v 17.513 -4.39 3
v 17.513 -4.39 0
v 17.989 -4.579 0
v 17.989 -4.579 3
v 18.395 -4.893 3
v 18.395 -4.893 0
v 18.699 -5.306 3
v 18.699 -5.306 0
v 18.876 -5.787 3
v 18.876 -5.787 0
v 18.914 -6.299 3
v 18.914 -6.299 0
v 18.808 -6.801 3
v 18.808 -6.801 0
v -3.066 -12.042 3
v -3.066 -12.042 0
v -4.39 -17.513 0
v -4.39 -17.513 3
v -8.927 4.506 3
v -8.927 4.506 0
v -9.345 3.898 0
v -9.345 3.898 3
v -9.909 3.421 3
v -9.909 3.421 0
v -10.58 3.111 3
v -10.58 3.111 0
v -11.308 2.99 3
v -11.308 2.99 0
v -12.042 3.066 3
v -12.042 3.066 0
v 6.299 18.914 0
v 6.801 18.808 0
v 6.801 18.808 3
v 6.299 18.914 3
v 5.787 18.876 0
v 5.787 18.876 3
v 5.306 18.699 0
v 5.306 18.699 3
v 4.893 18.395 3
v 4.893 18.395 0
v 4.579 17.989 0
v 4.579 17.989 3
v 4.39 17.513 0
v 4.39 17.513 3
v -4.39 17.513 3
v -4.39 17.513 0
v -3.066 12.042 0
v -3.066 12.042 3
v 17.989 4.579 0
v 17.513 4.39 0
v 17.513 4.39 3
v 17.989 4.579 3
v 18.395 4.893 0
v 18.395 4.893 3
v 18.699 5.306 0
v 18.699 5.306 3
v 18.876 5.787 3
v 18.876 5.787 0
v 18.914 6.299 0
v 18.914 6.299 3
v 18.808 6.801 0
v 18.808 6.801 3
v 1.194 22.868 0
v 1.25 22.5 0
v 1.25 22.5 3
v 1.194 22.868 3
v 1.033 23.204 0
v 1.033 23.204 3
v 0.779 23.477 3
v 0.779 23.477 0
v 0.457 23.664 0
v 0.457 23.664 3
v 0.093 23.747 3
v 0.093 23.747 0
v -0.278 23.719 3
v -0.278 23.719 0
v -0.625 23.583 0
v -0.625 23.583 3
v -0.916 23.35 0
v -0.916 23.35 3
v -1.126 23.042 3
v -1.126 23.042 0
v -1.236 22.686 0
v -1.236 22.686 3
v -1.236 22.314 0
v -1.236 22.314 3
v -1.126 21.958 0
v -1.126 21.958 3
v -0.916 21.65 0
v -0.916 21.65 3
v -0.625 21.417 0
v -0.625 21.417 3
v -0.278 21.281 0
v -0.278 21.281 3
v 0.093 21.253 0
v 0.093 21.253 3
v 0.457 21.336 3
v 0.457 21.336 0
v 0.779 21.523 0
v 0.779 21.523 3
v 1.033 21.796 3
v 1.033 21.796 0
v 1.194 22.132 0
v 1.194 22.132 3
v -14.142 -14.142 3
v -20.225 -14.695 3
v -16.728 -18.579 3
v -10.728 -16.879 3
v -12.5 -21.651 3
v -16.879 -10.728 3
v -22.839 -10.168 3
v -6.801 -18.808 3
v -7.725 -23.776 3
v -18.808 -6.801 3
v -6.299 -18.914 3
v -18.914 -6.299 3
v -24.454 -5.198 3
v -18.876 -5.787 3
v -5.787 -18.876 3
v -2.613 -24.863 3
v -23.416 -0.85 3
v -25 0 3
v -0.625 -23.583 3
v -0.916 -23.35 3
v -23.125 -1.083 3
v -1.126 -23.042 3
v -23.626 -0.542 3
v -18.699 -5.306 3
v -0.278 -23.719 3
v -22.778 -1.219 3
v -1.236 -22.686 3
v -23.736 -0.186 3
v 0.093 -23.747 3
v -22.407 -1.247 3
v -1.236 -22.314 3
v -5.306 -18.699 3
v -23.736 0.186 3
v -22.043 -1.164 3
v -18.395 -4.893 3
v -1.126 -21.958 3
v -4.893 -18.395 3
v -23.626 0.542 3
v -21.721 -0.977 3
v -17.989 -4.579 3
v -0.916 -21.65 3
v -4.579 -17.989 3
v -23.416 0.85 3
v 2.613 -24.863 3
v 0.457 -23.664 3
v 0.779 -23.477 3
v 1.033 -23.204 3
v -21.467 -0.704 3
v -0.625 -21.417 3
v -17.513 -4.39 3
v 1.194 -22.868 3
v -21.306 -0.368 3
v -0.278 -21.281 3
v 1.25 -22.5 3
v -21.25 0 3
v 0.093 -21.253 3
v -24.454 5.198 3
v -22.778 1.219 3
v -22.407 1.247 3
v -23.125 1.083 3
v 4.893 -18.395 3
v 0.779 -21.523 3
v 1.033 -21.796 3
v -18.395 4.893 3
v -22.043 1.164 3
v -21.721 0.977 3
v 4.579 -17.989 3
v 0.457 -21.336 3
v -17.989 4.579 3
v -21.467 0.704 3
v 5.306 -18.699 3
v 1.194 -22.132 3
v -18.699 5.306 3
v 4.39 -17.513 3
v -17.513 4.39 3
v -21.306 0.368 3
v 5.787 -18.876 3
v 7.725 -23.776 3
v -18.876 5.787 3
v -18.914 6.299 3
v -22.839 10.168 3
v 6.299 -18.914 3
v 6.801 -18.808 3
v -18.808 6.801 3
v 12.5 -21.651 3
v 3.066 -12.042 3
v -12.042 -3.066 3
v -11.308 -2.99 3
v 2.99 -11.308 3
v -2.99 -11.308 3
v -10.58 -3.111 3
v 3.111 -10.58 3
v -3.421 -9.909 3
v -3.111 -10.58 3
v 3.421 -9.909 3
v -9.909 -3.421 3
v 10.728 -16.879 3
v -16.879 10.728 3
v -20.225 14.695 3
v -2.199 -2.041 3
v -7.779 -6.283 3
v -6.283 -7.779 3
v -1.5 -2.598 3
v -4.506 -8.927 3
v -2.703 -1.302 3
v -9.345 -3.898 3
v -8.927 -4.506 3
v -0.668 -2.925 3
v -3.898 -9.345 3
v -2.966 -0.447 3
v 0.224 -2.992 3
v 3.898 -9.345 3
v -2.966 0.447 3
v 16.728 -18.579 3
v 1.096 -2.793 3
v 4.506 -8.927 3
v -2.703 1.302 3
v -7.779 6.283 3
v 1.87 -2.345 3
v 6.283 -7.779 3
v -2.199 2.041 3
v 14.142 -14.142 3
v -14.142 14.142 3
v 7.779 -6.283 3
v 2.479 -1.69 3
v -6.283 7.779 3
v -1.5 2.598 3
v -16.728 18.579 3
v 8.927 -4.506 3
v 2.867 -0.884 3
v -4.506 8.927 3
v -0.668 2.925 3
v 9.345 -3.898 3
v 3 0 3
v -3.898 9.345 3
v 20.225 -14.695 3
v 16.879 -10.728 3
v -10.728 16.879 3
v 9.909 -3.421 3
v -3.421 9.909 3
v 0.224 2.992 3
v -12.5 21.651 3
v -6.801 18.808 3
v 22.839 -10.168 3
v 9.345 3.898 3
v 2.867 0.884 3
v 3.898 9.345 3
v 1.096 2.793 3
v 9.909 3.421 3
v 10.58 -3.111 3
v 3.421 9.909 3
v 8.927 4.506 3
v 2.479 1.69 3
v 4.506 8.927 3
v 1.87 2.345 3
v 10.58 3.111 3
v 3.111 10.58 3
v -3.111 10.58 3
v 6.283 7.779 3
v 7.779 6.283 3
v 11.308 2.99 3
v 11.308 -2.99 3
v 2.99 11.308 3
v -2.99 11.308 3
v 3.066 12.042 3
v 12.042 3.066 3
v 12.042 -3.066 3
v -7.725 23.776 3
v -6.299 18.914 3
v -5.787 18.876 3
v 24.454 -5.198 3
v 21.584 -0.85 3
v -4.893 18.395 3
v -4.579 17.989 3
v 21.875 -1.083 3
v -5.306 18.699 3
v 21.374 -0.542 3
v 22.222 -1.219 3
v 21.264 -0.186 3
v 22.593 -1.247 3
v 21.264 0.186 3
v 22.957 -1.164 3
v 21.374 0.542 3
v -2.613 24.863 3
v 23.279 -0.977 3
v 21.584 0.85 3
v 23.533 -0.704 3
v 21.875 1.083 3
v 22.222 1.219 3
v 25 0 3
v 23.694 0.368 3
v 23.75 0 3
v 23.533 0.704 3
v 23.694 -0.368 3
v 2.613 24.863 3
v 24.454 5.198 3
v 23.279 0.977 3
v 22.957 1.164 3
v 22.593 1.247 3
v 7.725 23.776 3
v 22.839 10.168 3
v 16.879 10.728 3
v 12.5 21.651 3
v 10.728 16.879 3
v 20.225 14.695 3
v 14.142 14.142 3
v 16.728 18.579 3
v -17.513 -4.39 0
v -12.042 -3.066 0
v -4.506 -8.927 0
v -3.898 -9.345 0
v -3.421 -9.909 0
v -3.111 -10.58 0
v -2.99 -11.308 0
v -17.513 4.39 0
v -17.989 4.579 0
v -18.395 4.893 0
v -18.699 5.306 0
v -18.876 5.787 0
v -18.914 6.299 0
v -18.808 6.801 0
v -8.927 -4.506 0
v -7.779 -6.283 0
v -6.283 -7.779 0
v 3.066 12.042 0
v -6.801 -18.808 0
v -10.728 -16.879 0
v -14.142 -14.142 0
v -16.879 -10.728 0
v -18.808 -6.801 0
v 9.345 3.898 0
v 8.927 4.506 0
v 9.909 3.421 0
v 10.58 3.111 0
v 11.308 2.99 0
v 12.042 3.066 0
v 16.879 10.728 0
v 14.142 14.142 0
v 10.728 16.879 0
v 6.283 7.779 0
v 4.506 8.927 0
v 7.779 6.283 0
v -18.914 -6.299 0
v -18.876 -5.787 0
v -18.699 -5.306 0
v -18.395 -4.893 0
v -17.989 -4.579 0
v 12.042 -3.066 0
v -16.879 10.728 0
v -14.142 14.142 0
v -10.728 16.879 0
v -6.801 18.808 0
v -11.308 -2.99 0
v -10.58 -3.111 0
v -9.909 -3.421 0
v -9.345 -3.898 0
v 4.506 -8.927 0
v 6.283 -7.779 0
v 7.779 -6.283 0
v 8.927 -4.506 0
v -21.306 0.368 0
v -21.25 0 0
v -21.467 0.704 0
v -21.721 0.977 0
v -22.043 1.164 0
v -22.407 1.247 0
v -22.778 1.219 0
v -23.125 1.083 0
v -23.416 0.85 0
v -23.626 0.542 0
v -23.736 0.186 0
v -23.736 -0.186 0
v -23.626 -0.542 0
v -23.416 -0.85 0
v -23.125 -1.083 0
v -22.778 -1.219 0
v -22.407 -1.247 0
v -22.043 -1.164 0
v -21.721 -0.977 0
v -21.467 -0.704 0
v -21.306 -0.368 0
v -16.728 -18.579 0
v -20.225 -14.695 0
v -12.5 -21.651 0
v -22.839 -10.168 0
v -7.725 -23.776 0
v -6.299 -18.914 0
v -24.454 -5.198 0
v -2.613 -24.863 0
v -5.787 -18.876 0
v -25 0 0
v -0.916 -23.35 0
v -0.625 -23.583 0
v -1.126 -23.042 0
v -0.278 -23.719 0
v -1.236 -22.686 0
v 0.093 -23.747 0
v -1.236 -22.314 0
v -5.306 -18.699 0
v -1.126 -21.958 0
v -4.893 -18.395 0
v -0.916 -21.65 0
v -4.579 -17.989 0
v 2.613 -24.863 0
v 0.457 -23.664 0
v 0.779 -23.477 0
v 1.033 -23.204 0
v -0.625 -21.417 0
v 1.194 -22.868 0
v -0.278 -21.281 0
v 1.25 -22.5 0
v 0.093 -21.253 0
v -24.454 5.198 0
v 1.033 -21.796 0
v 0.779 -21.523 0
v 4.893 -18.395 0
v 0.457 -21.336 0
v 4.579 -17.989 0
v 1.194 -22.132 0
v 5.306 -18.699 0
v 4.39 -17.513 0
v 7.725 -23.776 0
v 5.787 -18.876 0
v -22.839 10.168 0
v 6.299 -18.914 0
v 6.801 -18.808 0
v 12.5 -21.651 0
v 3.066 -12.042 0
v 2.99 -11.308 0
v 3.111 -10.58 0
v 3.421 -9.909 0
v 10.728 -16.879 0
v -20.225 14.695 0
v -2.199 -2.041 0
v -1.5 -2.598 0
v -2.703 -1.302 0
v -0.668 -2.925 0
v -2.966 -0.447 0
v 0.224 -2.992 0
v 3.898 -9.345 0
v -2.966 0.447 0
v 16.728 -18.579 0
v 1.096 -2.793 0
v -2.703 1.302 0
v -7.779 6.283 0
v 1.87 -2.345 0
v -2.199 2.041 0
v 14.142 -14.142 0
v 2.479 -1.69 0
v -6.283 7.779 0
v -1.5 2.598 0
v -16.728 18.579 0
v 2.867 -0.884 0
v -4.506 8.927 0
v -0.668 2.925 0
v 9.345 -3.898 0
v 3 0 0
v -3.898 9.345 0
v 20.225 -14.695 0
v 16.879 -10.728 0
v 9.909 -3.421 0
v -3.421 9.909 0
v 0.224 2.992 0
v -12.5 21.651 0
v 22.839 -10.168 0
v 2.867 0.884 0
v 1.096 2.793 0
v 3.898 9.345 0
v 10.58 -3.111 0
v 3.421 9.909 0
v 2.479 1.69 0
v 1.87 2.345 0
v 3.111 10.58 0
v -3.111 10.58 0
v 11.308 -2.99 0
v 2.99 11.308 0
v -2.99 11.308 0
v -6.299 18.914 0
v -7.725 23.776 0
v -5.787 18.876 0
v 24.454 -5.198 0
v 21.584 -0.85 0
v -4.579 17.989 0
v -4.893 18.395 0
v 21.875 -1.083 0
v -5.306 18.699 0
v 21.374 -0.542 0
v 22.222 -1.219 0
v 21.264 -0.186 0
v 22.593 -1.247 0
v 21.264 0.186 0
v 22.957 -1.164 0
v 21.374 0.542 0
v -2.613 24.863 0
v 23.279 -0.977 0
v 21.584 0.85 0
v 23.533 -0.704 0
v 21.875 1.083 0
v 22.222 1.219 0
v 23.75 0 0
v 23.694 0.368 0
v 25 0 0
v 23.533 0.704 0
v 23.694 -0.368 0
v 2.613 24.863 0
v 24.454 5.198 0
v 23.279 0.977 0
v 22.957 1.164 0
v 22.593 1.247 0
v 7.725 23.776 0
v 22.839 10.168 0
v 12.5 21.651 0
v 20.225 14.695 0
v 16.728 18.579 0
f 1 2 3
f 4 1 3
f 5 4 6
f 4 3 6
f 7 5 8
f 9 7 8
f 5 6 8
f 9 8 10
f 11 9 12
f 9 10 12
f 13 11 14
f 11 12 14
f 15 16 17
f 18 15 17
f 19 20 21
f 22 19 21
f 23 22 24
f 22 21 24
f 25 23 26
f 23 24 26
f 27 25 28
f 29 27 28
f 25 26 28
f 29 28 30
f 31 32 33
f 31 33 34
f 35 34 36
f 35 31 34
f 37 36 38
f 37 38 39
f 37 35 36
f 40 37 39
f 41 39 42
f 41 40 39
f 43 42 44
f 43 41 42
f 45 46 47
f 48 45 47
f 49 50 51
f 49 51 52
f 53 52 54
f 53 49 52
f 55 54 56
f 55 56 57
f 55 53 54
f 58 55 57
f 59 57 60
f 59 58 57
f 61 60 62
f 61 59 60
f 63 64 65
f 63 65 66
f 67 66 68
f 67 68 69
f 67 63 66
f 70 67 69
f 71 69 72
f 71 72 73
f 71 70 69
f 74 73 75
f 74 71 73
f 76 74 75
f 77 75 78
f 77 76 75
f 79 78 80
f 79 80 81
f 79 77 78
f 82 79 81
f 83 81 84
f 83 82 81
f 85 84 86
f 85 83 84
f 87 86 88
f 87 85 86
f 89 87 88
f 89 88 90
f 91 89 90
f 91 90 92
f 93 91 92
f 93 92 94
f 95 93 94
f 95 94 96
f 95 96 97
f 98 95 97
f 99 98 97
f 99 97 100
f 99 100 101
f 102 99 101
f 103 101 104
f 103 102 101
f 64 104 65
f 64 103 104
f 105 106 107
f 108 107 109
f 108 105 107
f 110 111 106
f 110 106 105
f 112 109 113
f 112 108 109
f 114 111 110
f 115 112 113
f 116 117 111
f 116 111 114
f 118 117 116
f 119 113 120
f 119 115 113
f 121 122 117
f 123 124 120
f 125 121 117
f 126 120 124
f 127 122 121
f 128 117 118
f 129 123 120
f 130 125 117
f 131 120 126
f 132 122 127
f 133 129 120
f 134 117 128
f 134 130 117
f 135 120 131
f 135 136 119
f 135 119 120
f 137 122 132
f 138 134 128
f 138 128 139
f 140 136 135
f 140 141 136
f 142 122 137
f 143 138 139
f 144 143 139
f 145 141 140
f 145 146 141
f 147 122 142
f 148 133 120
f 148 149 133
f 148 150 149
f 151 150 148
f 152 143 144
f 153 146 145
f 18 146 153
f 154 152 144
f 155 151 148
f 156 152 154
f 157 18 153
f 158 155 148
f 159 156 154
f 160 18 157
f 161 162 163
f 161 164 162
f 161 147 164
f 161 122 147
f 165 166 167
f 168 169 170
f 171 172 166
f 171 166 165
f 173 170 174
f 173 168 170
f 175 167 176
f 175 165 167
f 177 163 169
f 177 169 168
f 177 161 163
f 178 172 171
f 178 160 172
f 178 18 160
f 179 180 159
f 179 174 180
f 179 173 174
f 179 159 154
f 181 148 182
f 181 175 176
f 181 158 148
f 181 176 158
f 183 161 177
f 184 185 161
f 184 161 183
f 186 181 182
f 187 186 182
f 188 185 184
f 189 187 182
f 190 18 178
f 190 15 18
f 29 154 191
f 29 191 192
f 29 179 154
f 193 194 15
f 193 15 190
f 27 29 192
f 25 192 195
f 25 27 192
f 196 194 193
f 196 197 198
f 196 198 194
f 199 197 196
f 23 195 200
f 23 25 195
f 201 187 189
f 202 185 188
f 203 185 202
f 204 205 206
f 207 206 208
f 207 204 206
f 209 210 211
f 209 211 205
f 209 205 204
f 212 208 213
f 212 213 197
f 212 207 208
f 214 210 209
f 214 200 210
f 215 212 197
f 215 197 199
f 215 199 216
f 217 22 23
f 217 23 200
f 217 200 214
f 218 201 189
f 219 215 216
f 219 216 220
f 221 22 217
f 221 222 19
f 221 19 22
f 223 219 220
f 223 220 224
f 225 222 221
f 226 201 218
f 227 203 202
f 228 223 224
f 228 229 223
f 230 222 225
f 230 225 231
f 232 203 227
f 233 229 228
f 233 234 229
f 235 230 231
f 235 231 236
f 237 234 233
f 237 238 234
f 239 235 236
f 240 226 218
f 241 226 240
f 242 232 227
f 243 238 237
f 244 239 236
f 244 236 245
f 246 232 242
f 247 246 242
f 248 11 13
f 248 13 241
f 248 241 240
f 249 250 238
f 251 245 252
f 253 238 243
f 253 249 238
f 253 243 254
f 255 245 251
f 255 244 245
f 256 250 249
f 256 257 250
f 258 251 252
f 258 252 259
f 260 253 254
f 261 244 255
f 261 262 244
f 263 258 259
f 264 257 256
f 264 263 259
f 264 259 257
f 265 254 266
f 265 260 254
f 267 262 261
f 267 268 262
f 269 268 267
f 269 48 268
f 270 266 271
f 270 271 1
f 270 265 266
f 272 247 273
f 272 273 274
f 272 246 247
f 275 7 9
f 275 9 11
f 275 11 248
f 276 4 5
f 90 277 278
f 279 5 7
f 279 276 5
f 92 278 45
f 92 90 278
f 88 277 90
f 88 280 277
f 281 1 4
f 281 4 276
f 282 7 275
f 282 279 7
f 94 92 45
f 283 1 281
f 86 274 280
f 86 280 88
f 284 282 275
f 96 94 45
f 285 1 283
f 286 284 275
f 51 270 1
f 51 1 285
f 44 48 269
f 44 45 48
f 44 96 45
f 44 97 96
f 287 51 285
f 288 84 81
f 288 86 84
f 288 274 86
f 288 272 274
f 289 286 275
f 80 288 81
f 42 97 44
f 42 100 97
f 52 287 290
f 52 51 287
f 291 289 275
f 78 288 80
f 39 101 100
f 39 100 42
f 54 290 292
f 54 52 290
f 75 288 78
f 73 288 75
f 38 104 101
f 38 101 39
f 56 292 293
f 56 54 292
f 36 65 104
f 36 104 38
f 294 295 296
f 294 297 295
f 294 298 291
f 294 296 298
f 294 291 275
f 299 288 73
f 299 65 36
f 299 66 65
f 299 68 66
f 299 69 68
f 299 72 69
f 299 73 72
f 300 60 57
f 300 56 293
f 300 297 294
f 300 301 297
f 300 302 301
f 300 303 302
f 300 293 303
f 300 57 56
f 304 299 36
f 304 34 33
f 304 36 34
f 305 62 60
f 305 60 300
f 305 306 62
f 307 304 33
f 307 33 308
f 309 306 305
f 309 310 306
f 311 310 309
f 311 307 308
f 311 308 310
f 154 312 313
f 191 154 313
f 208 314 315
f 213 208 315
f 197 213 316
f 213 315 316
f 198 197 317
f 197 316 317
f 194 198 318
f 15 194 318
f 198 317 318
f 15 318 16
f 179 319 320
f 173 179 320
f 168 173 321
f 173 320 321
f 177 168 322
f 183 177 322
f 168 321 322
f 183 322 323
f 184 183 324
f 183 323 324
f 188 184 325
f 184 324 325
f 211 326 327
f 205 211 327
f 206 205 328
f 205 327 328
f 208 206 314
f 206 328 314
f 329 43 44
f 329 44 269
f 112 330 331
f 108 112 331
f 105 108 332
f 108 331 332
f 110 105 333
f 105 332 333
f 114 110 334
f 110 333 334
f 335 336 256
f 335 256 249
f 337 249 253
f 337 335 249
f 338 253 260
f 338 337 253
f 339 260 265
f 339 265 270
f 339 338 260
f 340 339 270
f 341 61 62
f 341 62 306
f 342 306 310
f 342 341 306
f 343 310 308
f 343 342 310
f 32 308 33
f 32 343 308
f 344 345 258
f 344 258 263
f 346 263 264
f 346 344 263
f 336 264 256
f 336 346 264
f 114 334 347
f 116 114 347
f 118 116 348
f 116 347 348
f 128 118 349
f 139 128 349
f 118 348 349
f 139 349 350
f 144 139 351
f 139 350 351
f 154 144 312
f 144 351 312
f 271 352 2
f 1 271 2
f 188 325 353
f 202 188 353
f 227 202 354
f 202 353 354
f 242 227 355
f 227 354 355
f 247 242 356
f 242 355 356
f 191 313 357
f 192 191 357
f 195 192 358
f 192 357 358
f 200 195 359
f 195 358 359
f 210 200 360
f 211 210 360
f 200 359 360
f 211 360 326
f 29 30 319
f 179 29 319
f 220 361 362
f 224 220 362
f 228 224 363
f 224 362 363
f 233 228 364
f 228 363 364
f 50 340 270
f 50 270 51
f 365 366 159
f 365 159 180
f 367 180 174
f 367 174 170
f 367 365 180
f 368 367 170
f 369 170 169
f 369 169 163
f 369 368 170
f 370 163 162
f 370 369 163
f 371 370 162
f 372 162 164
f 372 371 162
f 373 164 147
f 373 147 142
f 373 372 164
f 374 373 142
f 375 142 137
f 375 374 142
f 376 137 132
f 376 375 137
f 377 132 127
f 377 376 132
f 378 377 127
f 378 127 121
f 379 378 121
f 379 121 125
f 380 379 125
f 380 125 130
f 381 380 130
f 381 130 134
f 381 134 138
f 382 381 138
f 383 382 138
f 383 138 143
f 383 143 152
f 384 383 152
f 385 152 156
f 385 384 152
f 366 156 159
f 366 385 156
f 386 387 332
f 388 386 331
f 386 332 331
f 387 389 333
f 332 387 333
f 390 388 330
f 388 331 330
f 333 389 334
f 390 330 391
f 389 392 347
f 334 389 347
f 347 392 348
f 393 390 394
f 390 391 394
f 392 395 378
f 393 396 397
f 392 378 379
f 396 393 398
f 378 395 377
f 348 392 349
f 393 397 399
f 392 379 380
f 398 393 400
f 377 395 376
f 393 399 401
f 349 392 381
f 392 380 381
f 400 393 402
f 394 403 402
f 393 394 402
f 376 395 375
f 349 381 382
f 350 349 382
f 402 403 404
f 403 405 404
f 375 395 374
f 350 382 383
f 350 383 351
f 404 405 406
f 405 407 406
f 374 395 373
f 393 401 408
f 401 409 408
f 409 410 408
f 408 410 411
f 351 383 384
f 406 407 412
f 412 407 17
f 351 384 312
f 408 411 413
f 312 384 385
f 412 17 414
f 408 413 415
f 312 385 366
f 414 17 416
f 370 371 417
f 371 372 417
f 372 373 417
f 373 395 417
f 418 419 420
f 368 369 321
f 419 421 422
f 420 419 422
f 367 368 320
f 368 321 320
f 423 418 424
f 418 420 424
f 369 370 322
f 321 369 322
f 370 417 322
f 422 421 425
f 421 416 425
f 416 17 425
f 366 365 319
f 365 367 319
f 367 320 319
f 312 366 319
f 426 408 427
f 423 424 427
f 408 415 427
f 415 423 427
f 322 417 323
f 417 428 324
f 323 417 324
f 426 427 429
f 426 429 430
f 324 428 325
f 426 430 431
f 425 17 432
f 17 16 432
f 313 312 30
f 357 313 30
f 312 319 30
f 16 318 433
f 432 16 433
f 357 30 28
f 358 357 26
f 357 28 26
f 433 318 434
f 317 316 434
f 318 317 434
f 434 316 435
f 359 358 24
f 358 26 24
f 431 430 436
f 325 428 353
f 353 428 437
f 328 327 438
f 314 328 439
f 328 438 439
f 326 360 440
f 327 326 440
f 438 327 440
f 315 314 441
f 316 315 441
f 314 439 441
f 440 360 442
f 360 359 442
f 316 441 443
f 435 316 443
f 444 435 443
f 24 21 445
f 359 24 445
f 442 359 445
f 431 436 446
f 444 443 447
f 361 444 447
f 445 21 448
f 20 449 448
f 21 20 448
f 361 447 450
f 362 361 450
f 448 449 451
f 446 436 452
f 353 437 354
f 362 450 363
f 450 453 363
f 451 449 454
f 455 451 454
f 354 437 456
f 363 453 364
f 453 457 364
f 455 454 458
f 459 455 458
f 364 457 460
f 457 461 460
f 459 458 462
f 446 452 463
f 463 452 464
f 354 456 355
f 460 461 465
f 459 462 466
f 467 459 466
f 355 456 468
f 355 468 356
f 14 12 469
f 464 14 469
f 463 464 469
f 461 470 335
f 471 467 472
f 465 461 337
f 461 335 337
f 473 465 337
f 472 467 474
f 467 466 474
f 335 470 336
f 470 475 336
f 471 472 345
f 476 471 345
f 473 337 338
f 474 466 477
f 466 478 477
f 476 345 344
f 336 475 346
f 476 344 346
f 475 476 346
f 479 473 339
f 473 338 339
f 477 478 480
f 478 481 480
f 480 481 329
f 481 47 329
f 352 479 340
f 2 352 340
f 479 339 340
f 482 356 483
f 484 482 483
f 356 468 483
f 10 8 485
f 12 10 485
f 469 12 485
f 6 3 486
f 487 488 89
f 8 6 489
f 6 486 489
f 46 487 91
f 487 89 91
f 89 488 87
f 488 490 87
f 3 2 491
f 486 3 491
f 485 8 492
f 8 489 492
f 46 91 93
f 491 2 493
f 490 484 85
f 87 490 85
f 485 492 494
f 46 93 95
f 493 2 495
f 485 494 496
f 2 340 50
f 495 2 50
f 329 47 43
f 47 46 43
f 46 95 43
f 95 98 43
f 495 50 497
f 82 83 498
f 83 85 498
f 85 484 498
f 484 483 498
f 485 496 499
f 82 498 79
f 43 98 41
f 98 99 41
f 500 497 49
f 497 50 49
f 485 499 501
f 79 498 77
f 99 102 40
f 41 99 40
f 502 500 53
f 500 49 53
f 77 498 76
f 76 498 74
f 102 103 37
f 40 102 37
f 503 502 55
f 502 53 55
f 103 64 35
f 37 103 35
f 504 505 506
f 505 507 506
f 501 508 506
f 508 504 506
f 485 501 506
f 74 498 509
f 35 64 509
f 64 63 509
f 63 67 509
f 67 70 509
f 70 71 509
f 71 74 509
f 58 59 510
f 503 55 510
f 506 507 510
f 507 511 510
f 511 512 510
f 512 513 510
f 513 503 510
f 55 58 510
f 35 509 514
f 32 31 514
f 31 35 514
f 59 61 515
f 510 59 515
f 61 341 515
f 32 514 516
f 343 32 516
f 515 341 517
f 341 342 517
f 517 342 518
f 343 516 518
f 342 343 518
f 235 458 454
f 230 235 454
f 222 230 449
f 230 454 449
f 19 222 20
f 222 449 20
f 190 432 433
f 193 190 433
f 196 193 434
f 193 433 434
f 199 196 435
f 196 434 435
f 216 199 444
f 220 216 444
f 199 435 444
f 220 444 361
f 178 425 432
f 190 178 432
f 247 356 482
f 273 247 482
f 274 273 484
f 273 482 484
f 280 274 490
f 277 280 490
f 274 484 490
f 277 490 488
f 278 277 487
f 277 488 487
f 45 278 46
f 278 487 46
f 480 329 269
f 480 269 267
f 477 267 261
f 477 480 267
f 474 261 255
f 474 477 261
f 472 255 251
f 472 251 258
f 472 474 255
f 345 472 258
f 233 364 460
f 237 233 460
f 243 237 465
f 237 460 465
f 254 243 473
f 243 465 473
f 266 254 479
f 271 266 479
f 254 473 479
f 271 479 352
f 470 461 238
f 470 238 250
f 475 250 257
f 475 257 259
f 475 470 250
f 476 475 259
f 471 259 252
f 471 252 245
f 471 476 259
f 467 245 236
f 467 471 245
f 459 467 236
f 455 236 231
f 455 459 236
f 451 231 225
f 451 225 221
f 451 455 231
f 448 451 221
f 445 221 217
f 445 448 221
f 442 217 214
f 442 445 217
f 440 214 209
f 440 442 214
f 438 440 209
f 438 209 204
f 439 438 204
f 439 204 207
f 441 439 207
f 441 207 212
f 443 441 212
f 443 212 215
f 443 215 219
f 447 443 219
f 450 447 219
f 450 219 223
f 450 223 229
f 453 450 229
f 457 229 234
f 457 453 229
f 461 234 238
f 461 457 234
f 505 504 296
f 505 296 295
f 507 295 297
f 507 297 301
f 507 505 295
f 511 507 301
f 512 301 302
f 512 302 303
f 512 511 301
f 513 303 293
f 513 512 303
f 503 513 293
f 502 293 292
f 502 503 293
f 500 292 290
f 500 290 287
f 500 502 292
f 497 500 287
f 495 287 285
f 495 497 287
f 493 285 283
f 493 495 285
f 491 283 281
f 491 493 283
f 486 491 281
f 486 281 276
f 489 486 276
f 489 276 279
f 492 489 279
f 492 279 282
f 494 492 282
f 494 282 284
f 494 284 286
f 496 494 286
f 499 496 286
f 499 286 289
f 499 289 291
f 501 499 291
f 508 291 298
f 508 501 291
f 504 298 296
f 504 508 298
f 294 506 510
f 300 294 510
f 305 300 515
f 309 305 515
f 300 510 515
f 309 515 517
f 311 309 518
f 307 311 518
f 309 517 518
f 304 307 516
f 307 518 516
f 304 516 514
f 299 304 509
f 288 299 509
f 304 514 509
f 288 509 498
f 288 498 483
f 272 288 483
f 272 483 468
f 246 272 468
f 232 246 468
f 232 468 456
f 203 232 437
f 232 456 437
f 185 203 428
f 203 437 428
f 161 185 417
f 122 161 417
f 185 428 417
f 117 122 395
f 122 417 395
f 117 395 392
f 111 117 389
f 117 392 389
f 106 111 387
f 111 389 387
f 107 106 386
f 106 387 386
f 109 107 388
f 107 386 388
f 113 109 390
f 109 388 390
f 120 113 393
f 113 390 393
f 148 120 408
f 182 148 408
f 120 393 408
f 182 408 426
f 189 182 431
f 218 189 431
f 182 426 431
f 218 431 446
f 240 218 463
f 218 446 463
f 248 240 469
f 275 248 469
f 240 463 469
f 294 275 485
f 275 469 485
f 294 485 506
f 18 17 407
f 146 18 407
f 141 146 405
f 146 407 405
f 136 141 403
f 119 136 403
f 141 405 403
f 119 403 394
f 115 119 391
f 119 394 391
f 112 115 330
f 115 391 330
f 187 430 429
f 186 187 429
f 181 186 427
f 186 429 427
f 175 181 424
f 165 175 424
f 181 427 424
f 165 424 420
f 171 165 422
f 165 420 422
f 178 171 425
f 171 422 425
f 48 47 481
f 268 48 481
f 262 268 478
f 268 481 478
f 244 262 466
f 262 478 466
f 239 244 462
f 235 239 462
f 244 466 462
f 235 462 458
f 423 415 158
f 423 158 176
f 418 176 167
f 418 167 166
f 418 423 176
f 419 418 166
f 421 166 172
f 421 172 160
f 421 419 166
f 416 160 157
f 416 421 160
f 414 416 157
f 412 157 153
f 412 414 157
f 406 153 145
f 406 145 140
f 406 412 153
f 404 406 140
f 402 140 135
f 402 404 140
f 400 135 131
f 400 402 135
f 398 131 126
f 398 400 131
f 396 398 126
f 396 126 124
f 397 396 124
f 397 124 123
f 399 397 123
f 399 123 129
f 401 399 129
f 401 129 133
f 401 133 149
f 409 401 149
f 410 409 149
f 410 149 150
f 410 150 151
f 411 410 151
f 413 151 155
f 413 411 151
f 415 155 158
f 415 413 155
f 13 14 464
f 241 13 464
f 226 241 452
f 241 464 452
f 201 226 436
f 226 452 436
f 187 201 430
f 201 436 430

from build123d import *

# Parameters (mm, degrees)
SKETCH1_R           = 25
SKETCH1_R_2         = 1.25
SKETCH1_R_3         = 3
BOSS_EXTRUDE1_DEPTH = 3


with BuildPart() as part:
    # Sketch1 → Boss-Extrude1 (new body)
    with BuildSketch(Plane.XY):
        Circle(SKETCH1_R)
        with Locations((0, 22.5)):
            Circle(SKETCH1_R_2, mode=Mode.SUBTRACT)
        Circle(SKETCH1_R_3, mode=Mode.SUBTRACT)
        with Locations((22.5, 0)):
            Circle(SKETCH1_R_2, mode=Mode.SUBTRACT)
        with Locations((0, -22.5)):
            Circle(SKETCH1_R_2, mode=Mode.SUBTRACT)
        with Locations((-22.5, 0)):
            Circle(SKETCH1_R_2, mode=Mode.SUBTRACT)
        with BuildLine():
            Line((4.39039635, 17.512781765), (3.066480056, 12.042499157))
            ThreePointArc((3.066480056, 12.042499157), (3.243806018, 10.234010462), (4.506349736, 8.927083066))
            ThreePointArc((4.506349736, 8.927083066), (7.071067812, 7.071067812), (8.927083066, 4.506349736))
            ThreePointArc((8.927083066, 4.506349736), (10.234010462, 3.243806018), (12.042499157, 3.066480056))
            Line((12.042499157, 3.066480056), (17.512781765, 4.39039635))
            ThreePointArc((17.512781765, 4.39039635), (18.69880908, 5.306187253), (18.808282105, 6.800626756))
            ThreePointArc((18.808282105, 6.800626756), (14.142135624, 14.142135624), (6.800626756, 18.808282105))
            ThreePointArc((6.800626756, 18.808282105), (5.306187253, 18.69880908), (4.39039635, 17.512781765))
        make_face(mode=Mode.SUBTRACT)
        with BuildLine():
            Line((4.39039635, -17.512781765), (3.066480056, -12.042499157))
            ThreePointArc((3.066480056, -12.042499157), (3.243806018, -10.234010462), (4.506349736, -8.927083066))
            ThreePointArc((4.506349736, -8.927083066), (7.071067812, -7.071067812), (8.927083066, -4.506349736))
            ThreePointArc((8.927083066, -4.506349736), (10.234010462, -3.243806018), (12.042499157, -3.066480056))
            Line((12.042499157, -3.066480056), (17.512781765, -4.39039635))
            ThreePointArc((17.512781765, -4.39039635), (18.69880908, -5.306187253), (18.808282105, -6.800626756))
            ThreePointArc((18.808282105, -6.800626756), (14.142135624, -14.142135624), (6.800626756, -18.808282105))
            ThreePointArc((6.800626756, -18.808282105), (5.306187253, -18.69880908), (4.39039635, -17.512781765))
        make_face(mode=Mode.SUBTRACT)
        with BuildLine():
            Line((-17.512781765, -4.39039635), (-12.042499157, -3.066480056))
            ThreePointArc((-12.042499157, -3.066480056), (-10.234010462, -3.243806018), (-8.927083066, -4.506349736))
            ThreePointArc((-8.927083066, -4.506349736), (-7.071067812, -7.071067812), (-4.506349736, -8.927083066))
            ThreePointArc((-4.506349736, -8.927083066), (-3.243806018, -10.234010462), (-3.066480056, -12.042499157))
            Line((-3.066480056, -12.042499157), (-4.39039635, -17.512781765))
            ThreePointArc((-4.39039635, -17.512781765), (-5.306187253, -18.69880908), (-6.800626756, -18.808282105))
            ThreePointArc((-6.800626756, -18.808282105), (-14.142135624, -14.142135624), (-18.808282105, -6.800626756))
            ThreePointArc((-18.808282105, -6.800626756), (-18.69880908, -5.306187253), (-17.512781765, -4.39039635))
        make_face(mode=Mode.SUBTRACT)
        with BuildLine():
            Line((-4.39039635, 17.512781765), (-3.066480056, 12.042499157))
            ThreePointArc((-3.066480056, 12.042499157), (-3.243806018, 10.234010462), (-4.506349736, 8.927083066))
            ThreePointArc((-4.506349736, 8.927083066), (-7.071067812, 7.071067812), (-8.927083066, 4.506349736))
            ThreePointArc((-8.927083066, 4.506349736), (-10.234010462, 3.243806018), (-12.042499157, 3.066480056))
            Line((-12.042499157, 3.066480056), (-17.512781765, 4.39039635))
            ThreePointArc((-17.512781765, 4.39039635), (-18.69880908, 5.306187253), (-18.808282105, 6.800626756))
            ThreePointArc((-18.808282105, 6.800626756), (-14.142135624, 14.142135624), (-6.800626756, 18.808282105))
            ThreePointArc((-6.800626756, 18.808282105), (-5.306187253, 18.69880908), (-4.39039635, 17.512781765))
        make_face(mode=Mode.SUBTRACT)
    extrude(amount=BOSS_EXTRUDE1_DEPTH)


solid = part.part
